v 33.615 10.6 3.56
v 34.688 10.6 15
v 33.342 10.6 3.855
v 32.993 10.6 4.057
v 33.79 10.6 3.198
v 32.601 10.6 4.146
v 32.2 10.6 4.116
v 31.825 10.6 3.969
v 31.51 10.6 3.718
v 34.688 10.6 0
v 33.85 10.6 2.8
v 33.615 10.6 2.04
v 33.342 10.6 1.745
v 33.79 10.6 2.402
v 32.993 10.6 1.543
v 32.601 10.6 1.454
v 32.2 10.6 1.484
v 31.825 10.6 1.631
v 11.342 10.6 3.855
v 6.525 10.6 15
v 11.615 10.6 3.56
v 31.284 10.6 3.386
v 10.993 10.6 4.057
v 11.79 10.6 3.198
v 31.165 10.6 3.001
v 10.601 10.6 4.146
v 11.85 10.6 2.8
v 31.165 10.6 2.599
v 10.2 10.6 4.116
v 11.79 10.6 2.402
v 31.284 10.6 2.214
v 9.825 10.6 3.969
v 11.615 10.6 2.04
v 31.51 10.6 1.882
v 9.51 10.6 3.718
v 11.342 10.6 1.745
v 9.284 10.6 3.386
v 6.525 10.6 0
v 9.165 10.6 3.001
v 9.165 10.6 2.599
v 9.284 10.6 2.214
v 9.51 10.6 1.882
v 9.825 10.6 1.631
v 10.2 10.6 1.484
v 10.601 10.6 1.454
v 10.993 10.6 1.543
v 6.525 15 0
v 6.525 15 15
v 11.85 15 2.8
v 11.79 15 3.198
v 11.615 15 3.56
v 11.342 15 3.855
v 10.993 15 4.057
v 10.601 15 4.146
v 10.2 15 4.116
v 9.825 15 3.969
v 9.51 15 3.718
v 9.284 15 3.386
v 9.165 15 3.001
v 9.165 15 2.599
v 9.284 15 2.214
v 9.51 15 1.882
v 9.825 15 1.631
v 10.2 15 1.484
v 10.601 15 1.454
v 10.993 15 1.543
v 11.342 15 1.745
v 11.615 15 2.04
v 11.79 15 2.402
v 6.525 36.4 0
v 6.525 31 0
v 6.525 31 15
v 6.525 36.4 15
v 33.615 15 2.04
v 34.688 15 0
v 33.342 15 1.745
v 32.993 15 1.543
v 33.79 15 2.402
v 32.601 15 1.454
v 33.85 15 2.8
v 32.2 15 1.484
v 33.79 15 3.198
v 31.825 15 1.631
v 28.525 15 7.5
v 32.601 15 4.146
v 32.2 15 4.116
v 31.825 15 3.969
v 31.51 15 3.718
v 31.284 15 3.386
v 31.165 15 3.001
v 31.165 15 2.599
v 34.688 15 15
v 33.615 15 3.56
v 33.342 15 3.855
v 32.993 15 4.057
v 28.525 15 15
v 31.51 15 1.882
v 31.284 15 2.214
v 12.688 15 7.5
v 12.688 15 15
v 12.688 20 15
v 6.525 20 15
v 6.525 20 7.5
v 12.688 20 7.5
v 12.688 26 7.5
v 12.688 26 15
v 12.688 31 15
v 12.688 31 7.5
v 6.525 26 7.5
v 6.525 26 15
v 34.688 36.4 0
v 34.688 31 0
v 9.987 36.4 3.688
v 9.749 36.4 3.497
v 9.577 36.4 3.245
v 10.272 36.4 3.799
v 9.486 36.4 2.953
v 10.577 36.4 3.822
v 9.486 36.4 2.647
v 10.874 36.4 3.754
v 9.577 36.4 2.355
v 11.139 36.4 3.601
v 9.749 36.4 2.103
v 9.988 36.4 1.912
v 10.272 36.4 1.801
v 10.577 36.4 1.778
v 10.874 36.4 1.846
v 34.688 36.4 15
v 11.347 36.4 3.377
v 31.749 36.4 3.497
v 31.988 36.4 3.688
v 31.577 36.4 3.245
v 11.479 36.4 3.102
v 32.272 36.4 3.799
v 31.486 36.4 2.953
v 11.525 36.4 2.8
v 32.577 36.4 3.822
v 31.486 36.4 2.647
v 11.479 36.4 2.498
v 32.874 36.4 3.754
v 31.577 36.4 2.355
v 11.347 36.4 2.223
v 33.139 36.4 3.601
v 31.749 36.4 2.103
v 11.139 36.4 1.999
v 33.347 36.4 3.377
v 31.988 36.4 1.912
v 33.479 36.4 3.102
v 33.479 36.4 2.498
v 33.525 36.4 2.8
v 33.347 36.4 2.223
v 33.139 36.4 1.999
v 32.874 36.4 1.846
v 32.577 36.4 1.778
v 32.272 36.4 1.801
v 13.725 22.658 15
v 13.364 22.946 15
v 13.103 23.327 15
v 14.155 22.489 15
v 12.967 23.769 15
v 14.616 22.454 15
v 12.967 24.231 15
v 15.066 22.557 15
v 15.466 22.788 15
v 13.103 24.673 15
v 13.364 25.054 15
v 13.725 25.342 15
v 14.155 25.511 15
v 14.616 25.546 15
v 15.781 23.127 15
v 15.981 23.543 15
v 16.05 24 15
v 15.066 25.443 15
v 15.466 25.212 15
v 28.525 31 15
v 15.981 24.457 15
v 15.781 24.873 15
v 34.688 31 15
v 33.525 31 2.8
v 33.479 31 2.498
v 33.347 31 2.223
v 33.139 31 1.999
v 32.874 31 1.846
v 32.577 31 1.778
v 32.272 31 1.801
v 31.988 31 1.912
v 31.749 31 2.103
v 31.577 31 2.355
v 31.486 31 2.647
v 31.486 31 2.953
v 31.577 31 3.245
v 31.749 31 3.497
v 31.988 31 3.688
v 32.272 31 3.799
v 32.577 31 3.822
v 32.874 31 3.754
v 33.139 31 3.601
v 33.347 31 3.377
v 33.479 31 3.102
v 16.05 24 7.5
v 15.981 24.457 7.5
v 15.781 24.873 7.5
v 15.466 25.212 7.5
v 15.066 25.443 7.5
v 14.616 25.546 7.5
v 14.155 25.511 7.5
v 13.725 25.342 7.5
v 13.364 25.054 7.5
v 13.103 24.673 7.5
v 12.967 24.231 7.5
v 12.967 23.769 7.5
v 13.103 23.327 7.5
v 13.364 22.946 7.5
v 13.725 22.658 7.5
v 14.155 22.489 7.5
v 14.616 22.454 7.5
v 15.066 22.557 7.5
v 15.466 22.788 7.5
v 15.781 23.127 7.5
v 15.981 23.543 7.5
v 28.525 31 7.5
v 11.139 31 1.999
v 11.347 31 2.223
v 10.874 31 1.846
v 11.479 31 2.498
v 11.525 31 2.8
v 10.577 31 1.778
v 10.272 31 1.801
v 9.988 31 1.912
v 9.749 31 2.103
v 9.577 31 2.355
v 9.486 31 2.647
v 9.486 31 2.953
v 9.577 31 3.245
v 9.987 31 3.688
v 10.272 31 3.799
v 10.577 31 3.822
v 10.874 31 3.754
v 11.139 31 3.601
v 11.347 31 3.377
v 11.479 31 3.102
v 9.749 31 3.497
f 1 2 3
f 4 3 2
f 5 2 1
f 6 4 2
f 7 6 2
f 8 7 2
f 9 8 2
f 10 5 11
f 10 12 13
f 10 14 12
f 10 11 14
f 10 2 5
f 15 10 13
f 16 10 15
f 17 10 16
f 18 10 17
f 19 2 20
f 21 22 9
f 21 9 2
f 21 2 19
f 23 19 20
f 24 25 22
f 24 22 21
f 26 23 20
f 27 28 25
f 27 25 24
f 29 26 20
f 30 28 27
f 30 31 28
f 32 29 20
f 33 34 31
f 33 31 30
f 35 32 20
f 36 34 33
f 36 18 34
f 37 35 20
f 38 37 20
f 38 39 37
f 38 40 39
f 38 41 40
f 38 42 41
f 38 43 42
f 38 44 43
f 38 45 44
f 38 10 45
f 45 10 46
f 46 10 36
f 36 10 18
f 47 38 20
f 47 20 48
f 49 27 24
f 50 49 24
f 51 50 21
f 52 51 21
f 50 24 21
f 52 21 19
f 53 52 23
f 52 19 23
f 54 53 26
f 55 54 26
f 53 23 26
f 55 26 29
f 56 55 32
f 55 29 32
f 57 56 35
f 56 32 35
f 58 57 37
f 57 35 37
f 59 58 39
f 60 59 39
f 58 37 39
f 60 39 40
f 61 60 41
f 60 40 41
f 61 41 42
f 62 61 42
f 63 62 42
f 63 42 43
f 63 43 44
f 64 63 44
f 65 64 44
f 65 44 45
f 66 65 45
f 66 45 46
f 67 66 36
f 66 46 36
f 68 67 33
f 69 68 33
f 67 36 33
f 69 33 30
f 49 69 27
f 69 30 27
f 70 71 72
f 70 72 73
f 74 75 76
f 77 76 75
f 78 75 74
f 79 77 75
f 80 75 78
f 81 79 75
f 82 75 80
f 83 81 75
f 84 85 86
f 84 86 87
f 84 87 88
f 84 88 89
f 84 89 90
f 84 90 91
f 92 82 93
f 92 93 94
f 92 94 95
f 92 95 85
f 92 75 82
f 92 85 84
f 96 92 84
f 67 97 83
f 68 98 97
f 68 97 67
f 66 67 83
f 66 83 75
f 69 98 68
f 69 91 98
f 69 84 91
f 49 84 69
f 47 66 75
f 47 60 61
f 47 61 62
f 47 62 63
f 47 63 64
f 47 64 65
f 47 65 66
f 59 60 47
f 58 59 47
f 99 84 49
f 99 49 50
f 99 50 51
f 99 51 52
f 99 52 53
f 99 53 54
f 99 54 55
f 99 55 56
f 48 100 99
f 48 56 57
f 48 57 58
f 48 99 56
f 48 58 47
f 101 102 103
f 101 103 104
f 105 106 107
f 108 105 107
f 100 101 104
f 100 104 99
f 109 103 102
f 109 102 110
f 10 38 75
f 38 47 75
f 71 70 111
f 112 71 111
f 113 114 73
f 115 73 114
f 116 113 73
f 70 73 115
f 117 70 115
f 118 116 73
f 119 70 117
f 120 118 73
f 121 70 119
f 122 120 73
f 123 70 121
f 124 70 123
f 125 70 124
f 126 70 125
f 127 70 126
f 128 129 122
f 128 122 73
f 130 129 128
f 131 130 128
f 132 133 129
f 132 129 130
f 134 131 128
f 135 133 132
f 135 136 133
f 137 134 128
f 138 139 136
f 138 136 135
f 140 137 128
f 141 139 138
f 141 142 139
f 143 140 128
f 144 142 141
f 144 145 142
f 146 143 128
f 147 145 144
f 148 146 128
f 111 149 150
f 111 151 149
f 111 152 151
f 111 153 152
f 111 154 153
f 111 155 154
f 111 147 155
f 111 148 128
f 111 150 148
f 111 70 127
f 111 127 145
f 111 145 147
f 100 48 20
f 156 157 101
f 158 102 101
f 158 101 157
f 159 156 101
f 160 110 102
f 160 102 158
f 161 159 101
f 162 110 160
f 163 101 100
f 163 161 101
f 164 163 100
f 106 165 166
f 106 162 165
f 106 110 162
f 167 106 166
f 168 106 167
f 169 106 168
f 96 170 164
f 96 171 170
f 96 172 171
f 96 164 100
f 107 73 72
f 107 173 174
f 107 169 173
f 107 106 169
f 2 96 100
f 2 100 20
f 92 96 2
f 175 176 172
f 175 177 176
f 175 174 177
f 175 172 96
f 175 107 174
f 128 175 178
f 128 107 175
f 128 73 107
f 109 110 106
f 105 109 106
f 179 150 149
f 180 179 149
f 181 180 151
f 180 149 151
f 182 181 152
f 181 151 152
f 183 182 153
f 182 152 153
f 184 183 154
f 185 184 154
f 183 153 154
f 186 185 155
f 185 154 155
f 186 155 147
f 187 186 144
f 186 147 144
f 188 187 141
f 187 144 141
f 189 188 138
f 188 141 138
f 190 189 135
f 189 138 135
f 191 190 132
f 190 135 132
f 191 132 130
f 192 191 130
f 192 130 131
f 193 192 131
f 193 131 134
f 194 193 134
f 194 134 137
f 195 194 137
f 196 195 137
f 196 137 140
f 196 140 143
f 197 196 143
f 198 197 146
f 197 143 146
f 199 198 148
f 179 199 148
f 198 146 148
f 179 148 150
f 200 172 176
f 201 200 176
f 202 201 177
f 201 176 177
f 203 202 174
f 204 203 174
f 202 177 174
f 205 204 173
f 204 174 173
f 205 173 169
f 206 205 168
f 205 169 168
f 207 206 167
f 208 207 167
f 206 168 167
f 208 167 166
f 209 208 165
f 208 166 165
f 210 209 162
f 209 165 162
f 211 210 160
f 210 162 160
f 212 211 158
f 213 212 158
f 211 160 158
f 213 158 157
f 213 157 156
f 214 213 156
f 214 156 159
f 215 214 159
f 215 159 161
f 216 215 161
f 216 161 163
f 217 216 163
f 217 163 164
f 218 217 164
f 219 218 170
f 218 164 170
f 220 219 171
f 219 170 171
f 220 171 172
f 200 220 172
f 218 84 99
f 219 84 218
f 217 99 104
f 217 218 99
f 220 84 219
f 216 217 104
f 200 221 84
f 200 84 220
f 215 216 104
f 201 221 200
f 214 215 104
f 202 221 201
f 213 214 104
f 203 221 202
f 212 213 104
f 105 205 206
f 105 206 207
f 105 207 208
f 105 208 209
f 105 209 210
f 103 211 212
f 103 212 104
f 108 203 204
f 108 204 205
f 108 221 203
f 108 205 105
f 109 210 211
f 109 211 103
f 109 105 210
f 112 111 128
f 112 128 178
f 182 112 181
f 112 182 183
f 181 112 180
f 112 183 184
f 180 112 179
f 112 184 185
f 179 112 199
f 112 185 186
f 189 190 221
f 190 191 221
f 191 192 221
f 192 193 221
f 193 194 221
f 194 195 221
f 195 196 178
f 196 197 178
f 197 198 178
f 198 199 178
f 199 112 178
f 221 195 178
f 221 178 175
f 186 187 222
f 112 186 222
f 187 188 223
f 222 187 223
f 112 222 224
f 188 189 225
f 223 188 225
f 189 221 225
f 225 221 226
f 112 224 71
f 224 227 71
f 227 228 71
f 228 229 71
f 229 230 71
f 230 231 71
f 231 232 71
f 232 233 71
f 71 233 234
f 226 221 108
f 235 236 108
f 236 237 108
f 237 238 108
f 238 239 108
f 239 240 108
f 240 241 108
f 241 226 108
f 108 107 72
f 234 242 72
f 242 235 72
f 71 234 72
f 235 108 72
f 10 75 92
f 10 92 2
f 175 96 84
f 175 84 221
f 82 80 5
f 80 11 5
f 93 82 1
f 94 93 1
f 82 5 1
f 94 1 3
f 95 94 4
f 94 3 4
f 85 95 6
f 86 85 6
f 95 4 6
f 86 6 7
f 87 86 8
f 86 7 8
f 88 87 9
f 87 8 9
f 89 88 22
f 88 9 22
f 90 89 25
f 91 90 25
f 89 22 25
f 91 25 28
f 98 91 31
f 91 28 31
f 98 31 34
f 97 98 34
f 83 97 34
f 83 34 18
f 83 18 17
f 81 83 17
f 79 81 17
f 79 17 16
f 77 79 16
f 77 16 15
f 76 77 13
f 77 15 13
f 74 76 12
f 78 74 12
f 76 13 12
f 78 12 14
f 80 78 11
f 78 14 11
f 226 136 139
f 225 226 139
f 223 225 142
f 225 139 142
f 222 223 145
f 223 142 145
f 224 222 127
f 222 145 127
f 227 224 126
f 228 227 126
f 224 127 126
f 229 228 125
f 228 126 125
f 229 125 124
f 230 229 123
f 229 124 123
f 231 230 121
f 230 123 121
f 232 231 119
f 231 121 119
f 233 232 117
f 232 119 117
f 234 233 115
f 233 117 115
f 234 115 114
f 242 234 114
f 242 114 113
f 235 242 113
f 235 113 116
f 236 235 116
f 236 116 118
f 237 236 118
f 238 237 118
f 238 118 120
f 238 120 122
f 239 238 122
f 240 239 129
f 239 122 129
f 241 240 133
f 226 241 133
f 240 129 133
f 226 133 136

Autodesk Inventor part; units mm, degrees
ref_plane "YZ Plane" through (0, 0, 0) normal (1, 0, 0) x (0, 1, 0)
ref_plane "XZ Plane" through (0, 0, 0) normal (0, 1, 0) x (-1, 0, 0)
ref_plane "XY Plane" through (0, 0, 0) normal (0, 0, 1) x (1, 0, 0)
sketch "스케치1" plane through (0, 0, 0) normal (0, 0, 1) x (1, 0, 0)
  line L0 (7.5, 38) -> (7.5, 36.5) projected
  line L1 (2, 38) -> (7.5, 38) projected
  line L2 (2, 38) -> (2, 8) projected
  line L3 (2, 8) -> (6.525, 8) projected
  line L4 (6.525, 10.5) -> (6.525, 8) projected
  line L5 (6.525, 10.5) -> (10.3997, 10.5) projected
  line L6 (10.3997, 10.5) -> (10.6003, 10.5) projected
  line L7 (10.6003, 10.5) -> (14.475, 10.5) projected
  line L8 (14.475, 10.5) -> (14.475, 8) projected
  line L9 (14.475, 8) -> (28.525, 8) projected
  line L10 (28.525, 10.5) -> (28.525, 8) projected
  line L11 (28.525, 10.5) -> (32.3997, 10.5) projected
  line L12 (32.3997, 10.5) -> (32.6003, 10.5) projected
  line L13 (32.6003, 10.5) -> (34.7876, 10.5) projected
  line L14 (34.7876, 10.5) -> (34.7876, 19.4) projected
  line L15 (36, 19.4) -> (34.7876, 19.4) projected
  line L16 (36, 24) -> (36, 19.4) projected
  line L17 (38.55, 24) -> (36, 24) projected
  line L18 (38.55, 24) -> (38.55, 25.4) projected
  line L19 (38.55, 25.4) -> (37.1, 25.4) projected
  line L20 (37.1, 25.4) -> (37.1, 35.5) projected
  line L21 (49.9, 35.5) -> (37.1, 35.5) projected
  line L22 (49.9, 25.4) -> (49.9, 35.5) projected
  line L23 (49.9, 25.4) -> (48.45, 25.4) projected
  line L24 (48.45, 24) -> (48.45, 25.4) projected
  line L25 (51, 24) -> (48.45, 24) projected
  line L26 (51, 24) -> (51, 10.5) projected
  line L27 (51, 10.5) -> (54.3997, 10.5) projected
  line L28 (54.3997, 10.5) -> (54.6003, 10.5) projected
  line L29 (54.6003, 10.5) -> (57.5, 10.5) projected
  line L30 (57.5, 36.5) -> (57.5, 10.5) projected
  line L31 (57.5, 36.5) -> (51.5, 36.5) projected
  line L32 (51.5, 38) -> (51.5, 36.5) projected
  line L33 (35.5, 38) -> (51.5, 38) projected
  line L34 (35.5, 36.5) -> (35.5, 38) projected
  line L35 (35.5, 36.5) -> (29.5, 36.5) projected
  line L36 (29.5, 38) -> (29.5, 36.5) projected
  line L37 (13.5, 38) -> (29.5, 38) projected
  line L38 (13.5, 36.5) -> (13.5, 38) projected
  line L39 (13.5, 36.5) -> (7.5, 36.5) projected
  line L40 (22.05, 14.2) -> (27.95, 14.2) projected
  line L41 (22.05, 18) -> (22.05, 14.2) projected
  line L42 (27.95, 18) -> (22.05, 18) projected
  line L43 (27.95, 14.2) -> (27.95, 18) projected
  line L44 (34.6876, 10.6) -> (7.6, 10.6)
  line L45 (7.6, 10.6) -> (7.6, 36.4)
  line L46 (7.6, 36.4) -> (34.6876, 36.4)
  line L47 (34.6876, 36.4) -> (34.6876, 10.6)
  line L48 (7.6, 36.4) -> (6.525, 36.4)
  line L49 (7.6, 10.6) -> (6.525, 10.6)
  line L50 (6.525, 10.6) -> (6.525, 36.4)
  line L51 (6.525, 36.4) -> (7.6, 36.4)
  line L52 (7.6, 36.4) -> (7.6, 10.6)
  point P0 (0, 0)
extrude "돌출1" add sketch "스케치1" along normal blind 15 contours L41 L42 L43 L40 | L44 L45 L46 L47 | L49 L50 L48 L45
sketch "스케치2" plane through (0, 0, 15) normal (0, 0, 1) x (1, 0, 0)
  line L0 (34.5, 38) -> (52.5, 38) projected
  line L1 (52.5, 38) -> (52.5, 36.5) projected
  line L2 (56.5, 36.5) -> (52.5, 36.5) projected
  line L3 (56.5, 38) -> (56.5, 36.5) projected
  line L4 (56.5, 38) -> (59.1, 38) projected
  line L5 (59.1, 38) -> (59.1, 40) projected
  line L6 (6, 40) -> (59.1, 40) projected
  line L7 (6, 38) -> (6, 40) projected
  line L8 (6, 38) -> (8.5, 38) projected
  line L9 (8.5, 38) -> (8.5, 36.5) projected
  line L10 (12.5, 36.5) -> (8.5, 36.5) projected
  line L11 (12.5, 38) -> (12.5, 36.5) projected
  line L12 (12.5, 38) -> (30.5, 38) projected
  line L13 (30.5, 38) -> (30.5, 36.5) projected
  line L14 (34.5, 36.5) -> (30.5, 36.5) projected
  line L15 (34.5, 38) -> (34.5, 36.5) projected
  line L16 (14.475, 10.5) -> (12.975, 10.5) projected
  line L17 (12.975, 10.5) -> (12.975, 8.5) projected
  line L18 (12.975, 8.5) -> (8.025, 8.5) projected
  line L19 (8.025, 10.5) -> (8.025, 8.5) projected
  line L20 (8.025, 10.5) -> (6.525, 10.5) projected
  line L21 (6.525, 10.5) -> (6.525, 8) projected
  line L22 (6, 8) -> (6.525, 8) projected
  line L23 (6, 8) -> (6, 6) projected
  line L24 (6, 6) -> (59.1, 6) projected
  line L25 (59.1, 8) -> (59.1, 6) projected
  line L26 (58.475, 8) -> (59.1, 8) projected
  line L27 (58.475, 8) -> (58.475, 10.5) projected
  line L28 (58.475, 10.5) -> (56.975, 10.5) projected
  line L29 (56.975, 10.5) -> (56.975, 8.5) projected
  line L30 (56.975, 8.5) -> (52.025, 8.5) projected
  line L31 (52.025, 10.5) -> (52.025, 8.5) projected
  line L32 (52.025, 10.5) -> (50.525, 10.5) projected
  line L33 (50.525, 10.5) -> (50.525, 8) projected
  line L34 (36.475, 8) -> (50.525, 8) projected
  line L35 (36.475, 8) -> (36.475, 10.5) projected
  line L36 (36.475, 10.5) -> (34.975, 10.5) projected
  line L37 (34.975, 10.5) -> (34.975, 8.5) projected
  line L38 (34.975, 8.5) -> (30.025, 8.5) projected
  line L39 (30.025, 10.5) -> (30.025, 8.5) projected
  line L40 (30.025, 10.5) -> (28.525, 10.5) projected
  line L41 (28.525, 10.5) -> (28.525, 8) projected
  line L42 (14.475, 8) -> (28.525, 8) projected
  line L43 (14.475, 8) -> (14.475, 10.5) projected
  line L44 (14.475, 36.4) -> (28.525, 36.4)
  line L45 (34.6876, 10.6) -> (34.6876, 36.4) projected
  line L46 (14.475, 10.6) -> (28.525, 10.6)
  line L47 (28.525, 10.6) -> (28.525, 36.4)
  line L48 (28.525, 36.4) -> (14.475, 36.4)
  line L49 (-13.0231, 23) -> (78.1205, 23)
  line L50 (14.5, -11.1) -> (14.5, 56.1)
  line L51 (34.6876, 36.4) -> (6.525, 36.4) projected
  line L52 (6.525, 36.4) -> (6.525, 10.6) projected
  line L53 (6.525, 10.6) -> (34.6876, 10.6) projected
  line L54 (28.525, 23) -> (34.6876, 23)
  line L55 (34.6876, 23) -> (34.6876, 31)
  line L56 (34.6876, 31) -> (28.525, 31)
  line L57 (28.525, 31) -> (28.525, 23)
  line L58 (28.525, 23) -> (34.6876, 23)
  line L59 (34.6876, 23) -> (34.6876, 15)
  line L60 (34.6876, 15) -> (28.525, 15)
  line L61 (28.525, 15) -> (28.525, 23)
  line L62 (6.525, 23) -> (12.688, 23)
  line L63 (12.688, 23) -> (12.688, 31)
  line L64 (12.688, 31) -> (6.525, 31)
  line L65 (6.525, 31) -> (6.525, 23)
  line L66 (14.5, 57.1) -> (14.5, -10.1)
  line L67 (12.688, 23) -> (12.688, 15)
  line L68 (12.688, 15) -> (6.525, 15)
  line L69 (6.525, 15) -> (6.525, 23)
  line L70 (6.525, 36.4) -> (6.525, 10.6) projected
  line L71 (12.688, 23) -> (6.525, 23)
  line L72 (6.525, 23) -> (6.525, 26)
  line L73 (6.525, 26) -> (12.688, 26)
  line L74 (12.688, 26) -> (12.688, 23)
  line L75 (12.688, 23) -> (6.525, 23)
  line L76 (6.525, 23) -> (6.525, 20)
  line L77 (6.525, 20) -> (12.688, 20)
  line L78 (12.688, 20) -> (12.688, 23)
  point P0 (0, 0)
  dimension "d3" = 6.163
  dimension "d4" = 8
extrude "돌출2" cut sketch "스케치2" against normal up to next contours L56 L45 L49 L47 | L49 L45 L60 L47 | L64 L63 L73 L52 | L67 L68 L52 L77
sketch "스케치4" plane through (6.525, 10.6, 0) normal (0, -1, 0) x (1, 0, 0)
  circle A0 centre (3.975, 2.8) radius 1.35 projected
  circle A1 centre (25.975, 2.8) radius 1.35
  circle A2 centre (25.975, 2.8) radius 1.55
  circle A3 centre (3.975, 2.8) radius 1.55
  point P0 (-6.525, 0)
  dimension "d14" = 0.2
  dimension "d15" = 0.2
extrude "돌출4" cut sketch "스케치4" against normal up to next contours A0 | A1
sketch "스케치5" plane through (6.525, 36.4, 0) normal (0, 1, 0) x (1, 0, 0)
  circle A0 centre (25.975, -2.8) radius 1.025 projected
  circle A1 centre (3.975, -2.8) radius 1.025 projected
  circle A2 centre (25.975, -2.8) radius 1.225
  circle A3 centre (3.975, -2.8) radius 1.225
  point P0 (-6.525, 0)
  dimension "d16" = 0.2
  dimension "d17" = 0.2
extrude "돌출5" cut sketch "스케치5" against normal up to next contours A0 | A1
sketch "스케치6" plane through (0, 0, 0) normal (0, 0, -1) x (-1, 0, 0)
  line L0 (-28.525, 31) -> (-34.6876, 31) projected
  line L1 (-34.6876, 31) -> (-34.6876, 36.4) projected
  line L2 (-34.6876, 36.4) -> (-6.525, 36.4) projected
  line L3 (-6.525, 36.4) -> (-6.525, 31) projected
  line L4 (-6.525, 31) -> (-12.688, 31) projected
  line L5 (-12.688, 31) -> (-12.688, 26) projected
  line L6 (-12.688, 26) -> (-6.525, 26) projected
  line L7 (-6.525, 26) -> (-6.525, 20) projected
  line L8 (-6.525, 20) -> (-12.688, 20) projected
  line L9 (-12.688, 20) -> (-12.688, 15) projected
  line L10 (-12.688, 15) -> (-6.525, 15) projected
  line L11 (-6.525, 15) -> (-6.525, 10.6) projected
  line L12 (-6.525, 10.6) -> (-34.6876, 10.6) projected
  line L13 (-34.6876, 10.6) -> (-34.6876, 15) projected
  line L14 (-34.6876, 15) -> (-28.525, 15) projected
  line L15 (-28.525, 15) -> (-28.525, 31) projected
  line L16 (-12.688, 31) -> (-28.525, 31)
  line L17 (-28.525, 31) -> (-28.525, 15)
  line L18 (-28.525, 15) -> (-12.688, 15)
  line L19 (-12.688, 15) -> (-12.688, 31)
  line L20 (13.0231, 24) -> (-78.1205, 24)
  line L21 (-14.5, 58.1) -> (-14.5, -9.1)
  point P0 (0, 0)
extrude "돌출6" cut sketch "스케치6" against normal blind 7.5 contours L16 L21 L20 L15 | L20 L21 L18 L15 | L16 L5 L19 L20 L21 | L20 L19 L9 L18 L21 | L20 L7 L8 L19 | L19 L6 L7 L20
sketch "스케치7" plane through (0, 0, 15) normal (0, 0, 1) x (1, 0, 0)
  circle A0 centre (14.5, 24) radius 1.55 projected
  point P0 (0, 0)
extrude "돌출7" cut sketch "스케치7" against normal up to next
properties part number "foot_bridge"
